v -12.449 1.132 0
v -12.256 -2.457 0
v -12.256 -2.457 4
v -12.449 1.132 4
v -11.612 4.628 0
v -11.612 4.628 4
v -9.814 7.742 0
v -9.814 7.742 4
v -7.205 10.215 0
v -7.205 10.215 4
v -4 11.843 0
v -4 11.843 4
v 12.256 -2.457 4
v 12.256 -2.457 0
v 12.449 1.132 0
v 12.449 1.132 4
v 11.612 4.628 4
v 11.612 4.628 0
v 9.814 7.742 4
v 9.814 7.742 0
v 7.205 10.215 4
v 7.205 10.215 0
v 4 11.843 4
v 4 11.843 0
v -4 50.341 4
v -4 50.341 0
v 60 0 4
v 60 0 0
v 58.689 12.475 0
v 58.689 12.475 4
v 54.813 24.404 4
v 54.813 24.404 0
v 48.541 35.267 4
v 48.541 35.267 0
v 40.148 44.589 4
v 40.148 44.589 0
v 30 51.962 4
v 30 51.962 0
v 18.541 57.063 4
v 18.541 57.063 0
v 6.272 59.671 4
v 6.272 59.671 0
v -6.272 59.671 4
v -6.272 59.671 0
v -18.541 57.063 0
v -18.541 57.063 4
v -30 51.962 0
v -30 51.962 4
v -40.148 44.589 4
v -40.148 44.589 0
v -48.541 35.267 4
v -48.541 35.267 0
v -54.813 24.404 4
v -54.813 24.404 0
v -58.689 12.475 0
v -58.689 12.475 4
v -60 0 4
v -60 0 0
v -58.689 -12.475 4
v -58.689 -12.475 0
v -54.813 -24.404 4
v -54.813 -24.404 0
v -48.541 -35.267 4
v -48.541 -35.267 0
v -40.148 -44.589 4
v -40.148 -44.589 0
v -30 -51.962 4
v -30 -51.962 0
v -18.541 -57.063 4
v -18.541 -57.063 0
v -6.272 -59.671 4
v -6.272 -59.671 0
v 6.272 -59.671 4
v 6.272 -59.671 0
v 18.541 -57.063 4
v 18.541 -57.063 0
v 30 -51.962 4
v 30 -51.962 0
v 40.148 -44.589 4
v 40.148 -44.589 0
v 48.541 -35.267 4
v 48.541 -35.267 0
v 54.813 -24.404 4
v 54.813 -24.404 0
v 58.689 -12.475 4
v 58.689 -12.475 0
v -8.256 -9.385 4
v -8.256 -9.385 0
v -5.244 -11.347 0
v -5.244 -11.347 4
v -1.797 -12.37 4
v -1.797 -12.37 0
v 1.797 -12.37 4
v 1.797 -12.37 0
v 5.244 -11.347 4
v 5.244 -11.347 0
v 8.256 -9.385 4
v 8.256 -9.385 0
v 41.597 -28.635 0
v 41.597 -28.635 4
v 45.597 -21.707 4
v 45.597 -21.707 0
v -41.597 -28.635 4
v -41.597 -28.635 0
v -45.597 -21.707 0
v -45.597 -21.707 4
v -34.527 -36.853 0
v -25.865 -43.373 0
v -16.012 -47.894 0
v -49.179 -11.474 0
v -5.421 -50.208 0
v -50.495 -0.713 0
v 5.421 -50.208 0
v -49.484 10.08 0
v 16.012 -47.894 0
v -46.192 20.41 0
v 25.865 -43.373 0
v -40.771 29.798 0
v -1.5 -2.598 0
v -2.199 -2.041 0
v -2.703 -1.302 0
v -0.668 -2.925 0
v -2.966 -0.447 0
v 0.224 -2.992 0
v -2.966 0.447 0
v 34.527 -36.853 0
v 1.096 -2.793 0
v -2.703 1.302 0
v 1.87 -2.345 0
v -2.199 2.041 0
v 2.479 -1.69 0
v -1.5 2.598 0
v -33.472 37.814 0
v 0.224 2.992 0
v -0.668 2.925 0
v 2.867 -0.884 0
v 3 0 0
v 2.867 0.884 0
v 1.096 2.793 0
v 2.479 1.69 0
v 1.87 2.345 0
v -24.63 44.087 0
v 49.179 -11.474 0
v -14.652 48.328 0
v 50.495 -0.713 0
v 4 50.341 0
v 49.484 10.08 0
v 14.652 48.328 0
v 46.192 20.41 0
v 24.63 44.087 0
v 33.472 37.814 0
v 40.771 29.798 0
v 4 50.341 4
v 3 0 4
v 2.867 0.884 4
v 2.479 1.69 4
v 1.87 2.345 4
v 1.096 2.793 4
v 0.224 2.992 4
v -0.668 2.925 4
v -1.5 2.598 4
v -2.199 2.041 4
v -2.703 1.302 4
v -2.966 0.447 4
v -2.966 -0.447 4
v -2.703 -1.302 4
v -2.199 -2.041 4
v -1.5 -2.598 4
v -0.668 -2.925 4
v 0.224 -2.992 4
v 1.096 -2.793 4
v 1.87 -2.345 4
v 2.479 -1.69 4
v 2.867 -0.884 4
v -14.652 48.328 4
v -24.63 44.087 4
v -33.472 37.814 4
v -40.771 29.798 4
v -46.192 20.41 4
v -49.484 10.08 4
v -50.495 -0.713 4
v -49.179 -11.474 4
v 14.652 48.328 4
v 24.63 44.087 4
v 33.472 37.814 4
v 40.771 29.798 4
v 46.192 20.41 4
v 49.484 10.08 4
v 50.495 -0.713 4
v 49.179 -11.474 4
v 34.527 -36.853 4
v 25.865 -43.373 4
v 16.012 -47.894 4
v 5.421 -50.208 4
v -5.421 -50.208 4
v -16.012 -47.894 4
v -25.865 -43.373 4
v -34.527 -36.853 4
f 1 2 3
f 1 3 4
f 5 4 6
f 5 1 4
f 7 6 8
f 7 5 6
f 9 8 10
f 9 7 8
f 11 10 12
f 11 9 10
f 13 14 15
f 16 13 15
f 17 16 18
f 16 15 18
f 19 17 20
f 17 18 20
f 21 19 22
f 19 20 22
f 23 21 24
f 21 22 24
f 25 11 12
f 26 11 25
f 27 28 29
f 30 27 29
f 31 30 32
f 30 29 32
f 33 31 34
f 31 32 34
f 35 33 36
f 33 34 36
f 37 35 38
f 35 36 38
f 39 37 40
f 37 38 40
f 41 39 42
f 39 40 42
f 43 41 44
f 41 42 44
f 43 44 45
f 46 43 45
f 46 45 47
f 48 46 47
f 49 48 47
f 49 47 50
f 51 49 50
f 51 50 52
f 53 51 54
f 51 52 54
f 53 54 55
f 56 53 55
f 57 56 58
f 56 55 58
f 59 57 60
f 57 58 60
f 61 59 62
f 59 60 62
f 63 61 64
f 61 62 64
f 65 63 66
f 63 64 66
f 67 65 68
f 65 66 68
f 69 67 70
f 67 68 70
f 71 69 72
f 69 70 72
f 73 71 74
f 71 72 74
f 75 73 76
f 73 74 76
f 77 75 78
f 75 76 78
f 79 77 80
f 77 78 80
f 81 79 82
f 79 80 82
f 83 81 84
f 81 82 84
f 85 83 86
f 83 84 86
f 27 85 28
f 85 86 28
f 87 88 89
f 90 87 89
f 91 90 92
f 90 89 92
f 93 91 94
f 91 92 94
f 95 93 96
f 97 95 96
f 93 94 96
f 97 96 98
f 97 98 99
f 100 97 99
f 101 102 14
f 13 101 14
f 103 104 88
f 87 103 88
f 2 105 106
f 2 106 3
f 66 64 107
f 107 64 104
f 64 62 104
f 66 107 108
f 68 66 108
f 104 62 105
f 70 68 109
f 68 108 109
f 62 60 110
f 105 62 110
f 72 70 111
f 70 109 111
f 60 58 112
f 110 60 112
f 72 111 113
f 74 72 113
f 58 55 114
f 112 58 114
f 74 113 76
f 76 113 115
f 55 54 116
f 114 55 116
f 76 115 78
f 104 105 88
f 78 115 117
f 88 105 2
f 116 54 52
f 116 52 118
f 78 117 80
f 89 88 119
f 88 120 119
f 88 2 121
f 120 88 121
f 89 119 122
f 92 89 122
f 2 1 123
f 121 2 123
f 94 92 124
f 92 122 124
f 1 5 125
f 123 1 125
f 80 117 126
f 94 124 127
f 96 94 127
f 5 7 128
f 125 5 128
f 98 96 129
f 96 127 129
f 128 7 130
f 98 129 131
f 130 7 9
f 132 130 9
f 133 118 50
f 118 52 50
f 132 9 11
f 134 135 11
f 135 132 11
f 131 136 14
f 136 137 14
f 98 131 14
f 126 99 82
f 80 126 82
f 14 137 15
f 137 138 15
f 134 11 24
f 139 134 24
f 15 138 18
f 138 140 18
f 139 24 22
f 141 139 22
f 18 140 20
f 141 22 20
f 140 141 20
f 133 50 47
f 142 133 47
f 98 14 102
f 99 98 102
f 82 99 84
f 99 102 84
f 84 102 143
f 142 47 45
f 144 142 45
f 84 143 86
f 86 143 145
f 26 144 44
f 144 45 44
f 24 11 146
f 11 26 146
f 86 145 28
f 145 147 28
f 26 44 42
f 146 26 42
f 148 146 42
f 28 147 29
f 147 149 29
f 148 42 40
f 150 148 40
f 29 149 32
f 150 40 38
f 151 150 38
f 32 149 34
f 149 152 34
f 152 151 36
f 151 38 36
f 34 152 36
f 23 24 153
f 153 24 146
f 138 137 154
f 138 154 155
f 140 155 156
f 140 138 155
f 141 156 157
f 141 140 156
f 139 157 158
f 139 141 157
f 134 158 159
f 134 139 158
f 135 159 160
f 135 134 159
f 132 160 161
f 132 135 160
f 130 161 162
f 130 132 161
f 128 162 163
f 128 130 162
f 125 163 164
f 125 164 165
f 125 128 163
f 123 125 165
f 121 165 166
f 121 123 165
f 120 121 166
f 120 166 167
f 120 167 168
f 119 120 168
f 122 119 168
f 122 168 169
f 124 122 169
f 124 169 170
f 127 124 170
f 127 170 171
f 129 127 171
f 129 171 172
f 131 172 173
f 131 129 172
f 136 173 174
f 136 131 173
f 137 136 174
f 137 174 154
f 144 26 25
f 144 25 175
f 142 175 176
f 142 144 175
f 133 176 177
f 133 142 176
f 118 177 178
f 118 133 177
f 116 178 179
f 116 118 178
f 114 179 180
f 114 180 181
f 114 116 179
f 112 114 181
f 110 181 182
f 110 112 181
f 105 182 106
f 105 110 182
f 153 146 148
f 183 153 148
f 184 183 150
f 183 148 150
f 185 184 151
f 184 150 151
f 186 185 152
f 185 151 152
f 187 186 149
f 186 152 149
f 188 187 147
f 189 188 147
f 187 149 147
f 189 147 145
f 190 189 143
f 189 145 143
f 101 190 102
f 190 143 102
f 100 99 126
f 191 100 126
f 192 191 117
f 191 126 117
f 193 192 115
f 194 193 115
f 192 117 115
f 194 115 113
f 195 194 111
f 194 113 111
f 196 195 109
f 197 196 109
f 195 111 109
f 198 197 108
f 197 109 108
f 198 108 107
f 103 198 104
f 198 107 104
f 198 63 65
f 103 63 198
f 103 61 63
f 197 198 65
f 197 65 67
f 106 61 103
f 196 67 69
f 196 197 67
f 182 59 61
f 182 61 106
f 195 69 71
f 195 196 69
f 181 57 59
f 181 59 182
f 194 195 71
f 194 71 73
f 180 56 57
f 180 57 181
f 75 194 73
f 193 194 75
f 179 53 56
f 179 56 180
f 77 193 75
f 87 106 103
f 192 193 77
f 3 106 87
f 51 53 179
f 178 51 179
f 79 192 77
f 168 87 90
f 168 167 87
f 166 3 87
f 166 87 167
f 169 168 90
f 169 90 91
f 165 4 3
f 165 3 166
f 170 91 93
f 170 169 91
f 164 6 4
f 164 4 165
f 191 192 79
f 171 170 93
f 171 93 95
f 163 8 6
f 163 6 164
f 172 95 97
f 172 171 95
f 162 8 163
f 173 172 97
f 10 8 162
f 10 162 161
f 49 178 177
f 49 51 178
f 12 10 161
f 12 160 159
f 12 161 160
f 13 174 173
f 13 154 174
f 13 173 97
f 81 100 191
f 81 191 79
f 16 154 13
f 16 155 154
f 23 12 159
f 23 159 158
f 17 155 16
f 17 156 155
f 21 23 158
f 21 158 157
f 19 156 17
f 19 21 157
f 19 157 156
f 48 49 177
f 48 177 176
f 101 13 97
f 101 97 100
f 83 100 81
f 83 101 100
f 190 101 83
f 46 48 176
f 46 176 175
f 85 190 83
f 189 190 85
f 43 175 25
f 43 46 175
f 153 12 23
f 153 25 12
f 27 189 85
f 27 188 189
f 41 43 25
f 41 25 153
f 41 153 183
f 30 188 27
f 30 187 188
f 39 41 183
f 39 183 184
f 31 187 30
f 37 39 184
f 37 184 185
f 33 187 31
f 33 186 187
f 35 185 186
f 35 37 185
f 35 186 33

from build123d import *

# Parameters (mm, degrees)
SKETCH_1_R      = 60
SKETCH_1_R_2    = 3
EXTRUDE_1_DEPTH = 4


with BuildPart() as part:
    # 草图1 → 凸台-拉伸1 (new body)
    with BuildSketch(Plane.XY):
        Circle(SKETCH_1_R)
        Circle(SKETCH_1_R_2, mode=Mode.SUBTRACT)
        with BuildLine():
            Line((-4, 11.842719282), (-4, 50.341334905))
            ThreePointArc((-4, 50.341334905), (-43.734282891, 25.25), (-45.596874888, -21.706565837))
            Line((-45.596874888, -21.706565837), (-12.256095748, -2.457258026))
            ThreePointArc((-12.256095748, -2.457258026), (-10.825317547, 6.25), (-4, 11.842719282))
        make_face(mode=Mode.SUBTRACT)
        with BuildLine():
            Line((4, 11.842719282), (4, 50.341334905))
            ThreePointArc((4, 50.341334905), (43.734282891, 25.25), (45.596874888, -21.706565837))
            Line((45.596874888, -21.706565837), (12.256095748, -2.457258026))
            ThreePointArc((12.256095748, -2.457258026), (10.825317547, 6.25), (4, 11.842719282))
        make_face(mode=Mode.SUBTRACT)
        with BuildLine():
            Line((8.256095748, -9.385461256), (41.596874888, -28.634769068))
            ThreePointArc((41.596874888, -28.634769068), (0, -50.5), (-41.596874888, -28.634769068))
            Line((-41.596874888, -28.634769068), (-8.256095748, -9.385461256))
            ThreePointArc((-8.256095748, -9.385461256), (0, -12.5), (8.256095748, -9.385461256))
        make_face(mode=Mode.SUBTRACT)
    extrude(amount=EXTRUDE_1_DEPTH)


solid = part.part
